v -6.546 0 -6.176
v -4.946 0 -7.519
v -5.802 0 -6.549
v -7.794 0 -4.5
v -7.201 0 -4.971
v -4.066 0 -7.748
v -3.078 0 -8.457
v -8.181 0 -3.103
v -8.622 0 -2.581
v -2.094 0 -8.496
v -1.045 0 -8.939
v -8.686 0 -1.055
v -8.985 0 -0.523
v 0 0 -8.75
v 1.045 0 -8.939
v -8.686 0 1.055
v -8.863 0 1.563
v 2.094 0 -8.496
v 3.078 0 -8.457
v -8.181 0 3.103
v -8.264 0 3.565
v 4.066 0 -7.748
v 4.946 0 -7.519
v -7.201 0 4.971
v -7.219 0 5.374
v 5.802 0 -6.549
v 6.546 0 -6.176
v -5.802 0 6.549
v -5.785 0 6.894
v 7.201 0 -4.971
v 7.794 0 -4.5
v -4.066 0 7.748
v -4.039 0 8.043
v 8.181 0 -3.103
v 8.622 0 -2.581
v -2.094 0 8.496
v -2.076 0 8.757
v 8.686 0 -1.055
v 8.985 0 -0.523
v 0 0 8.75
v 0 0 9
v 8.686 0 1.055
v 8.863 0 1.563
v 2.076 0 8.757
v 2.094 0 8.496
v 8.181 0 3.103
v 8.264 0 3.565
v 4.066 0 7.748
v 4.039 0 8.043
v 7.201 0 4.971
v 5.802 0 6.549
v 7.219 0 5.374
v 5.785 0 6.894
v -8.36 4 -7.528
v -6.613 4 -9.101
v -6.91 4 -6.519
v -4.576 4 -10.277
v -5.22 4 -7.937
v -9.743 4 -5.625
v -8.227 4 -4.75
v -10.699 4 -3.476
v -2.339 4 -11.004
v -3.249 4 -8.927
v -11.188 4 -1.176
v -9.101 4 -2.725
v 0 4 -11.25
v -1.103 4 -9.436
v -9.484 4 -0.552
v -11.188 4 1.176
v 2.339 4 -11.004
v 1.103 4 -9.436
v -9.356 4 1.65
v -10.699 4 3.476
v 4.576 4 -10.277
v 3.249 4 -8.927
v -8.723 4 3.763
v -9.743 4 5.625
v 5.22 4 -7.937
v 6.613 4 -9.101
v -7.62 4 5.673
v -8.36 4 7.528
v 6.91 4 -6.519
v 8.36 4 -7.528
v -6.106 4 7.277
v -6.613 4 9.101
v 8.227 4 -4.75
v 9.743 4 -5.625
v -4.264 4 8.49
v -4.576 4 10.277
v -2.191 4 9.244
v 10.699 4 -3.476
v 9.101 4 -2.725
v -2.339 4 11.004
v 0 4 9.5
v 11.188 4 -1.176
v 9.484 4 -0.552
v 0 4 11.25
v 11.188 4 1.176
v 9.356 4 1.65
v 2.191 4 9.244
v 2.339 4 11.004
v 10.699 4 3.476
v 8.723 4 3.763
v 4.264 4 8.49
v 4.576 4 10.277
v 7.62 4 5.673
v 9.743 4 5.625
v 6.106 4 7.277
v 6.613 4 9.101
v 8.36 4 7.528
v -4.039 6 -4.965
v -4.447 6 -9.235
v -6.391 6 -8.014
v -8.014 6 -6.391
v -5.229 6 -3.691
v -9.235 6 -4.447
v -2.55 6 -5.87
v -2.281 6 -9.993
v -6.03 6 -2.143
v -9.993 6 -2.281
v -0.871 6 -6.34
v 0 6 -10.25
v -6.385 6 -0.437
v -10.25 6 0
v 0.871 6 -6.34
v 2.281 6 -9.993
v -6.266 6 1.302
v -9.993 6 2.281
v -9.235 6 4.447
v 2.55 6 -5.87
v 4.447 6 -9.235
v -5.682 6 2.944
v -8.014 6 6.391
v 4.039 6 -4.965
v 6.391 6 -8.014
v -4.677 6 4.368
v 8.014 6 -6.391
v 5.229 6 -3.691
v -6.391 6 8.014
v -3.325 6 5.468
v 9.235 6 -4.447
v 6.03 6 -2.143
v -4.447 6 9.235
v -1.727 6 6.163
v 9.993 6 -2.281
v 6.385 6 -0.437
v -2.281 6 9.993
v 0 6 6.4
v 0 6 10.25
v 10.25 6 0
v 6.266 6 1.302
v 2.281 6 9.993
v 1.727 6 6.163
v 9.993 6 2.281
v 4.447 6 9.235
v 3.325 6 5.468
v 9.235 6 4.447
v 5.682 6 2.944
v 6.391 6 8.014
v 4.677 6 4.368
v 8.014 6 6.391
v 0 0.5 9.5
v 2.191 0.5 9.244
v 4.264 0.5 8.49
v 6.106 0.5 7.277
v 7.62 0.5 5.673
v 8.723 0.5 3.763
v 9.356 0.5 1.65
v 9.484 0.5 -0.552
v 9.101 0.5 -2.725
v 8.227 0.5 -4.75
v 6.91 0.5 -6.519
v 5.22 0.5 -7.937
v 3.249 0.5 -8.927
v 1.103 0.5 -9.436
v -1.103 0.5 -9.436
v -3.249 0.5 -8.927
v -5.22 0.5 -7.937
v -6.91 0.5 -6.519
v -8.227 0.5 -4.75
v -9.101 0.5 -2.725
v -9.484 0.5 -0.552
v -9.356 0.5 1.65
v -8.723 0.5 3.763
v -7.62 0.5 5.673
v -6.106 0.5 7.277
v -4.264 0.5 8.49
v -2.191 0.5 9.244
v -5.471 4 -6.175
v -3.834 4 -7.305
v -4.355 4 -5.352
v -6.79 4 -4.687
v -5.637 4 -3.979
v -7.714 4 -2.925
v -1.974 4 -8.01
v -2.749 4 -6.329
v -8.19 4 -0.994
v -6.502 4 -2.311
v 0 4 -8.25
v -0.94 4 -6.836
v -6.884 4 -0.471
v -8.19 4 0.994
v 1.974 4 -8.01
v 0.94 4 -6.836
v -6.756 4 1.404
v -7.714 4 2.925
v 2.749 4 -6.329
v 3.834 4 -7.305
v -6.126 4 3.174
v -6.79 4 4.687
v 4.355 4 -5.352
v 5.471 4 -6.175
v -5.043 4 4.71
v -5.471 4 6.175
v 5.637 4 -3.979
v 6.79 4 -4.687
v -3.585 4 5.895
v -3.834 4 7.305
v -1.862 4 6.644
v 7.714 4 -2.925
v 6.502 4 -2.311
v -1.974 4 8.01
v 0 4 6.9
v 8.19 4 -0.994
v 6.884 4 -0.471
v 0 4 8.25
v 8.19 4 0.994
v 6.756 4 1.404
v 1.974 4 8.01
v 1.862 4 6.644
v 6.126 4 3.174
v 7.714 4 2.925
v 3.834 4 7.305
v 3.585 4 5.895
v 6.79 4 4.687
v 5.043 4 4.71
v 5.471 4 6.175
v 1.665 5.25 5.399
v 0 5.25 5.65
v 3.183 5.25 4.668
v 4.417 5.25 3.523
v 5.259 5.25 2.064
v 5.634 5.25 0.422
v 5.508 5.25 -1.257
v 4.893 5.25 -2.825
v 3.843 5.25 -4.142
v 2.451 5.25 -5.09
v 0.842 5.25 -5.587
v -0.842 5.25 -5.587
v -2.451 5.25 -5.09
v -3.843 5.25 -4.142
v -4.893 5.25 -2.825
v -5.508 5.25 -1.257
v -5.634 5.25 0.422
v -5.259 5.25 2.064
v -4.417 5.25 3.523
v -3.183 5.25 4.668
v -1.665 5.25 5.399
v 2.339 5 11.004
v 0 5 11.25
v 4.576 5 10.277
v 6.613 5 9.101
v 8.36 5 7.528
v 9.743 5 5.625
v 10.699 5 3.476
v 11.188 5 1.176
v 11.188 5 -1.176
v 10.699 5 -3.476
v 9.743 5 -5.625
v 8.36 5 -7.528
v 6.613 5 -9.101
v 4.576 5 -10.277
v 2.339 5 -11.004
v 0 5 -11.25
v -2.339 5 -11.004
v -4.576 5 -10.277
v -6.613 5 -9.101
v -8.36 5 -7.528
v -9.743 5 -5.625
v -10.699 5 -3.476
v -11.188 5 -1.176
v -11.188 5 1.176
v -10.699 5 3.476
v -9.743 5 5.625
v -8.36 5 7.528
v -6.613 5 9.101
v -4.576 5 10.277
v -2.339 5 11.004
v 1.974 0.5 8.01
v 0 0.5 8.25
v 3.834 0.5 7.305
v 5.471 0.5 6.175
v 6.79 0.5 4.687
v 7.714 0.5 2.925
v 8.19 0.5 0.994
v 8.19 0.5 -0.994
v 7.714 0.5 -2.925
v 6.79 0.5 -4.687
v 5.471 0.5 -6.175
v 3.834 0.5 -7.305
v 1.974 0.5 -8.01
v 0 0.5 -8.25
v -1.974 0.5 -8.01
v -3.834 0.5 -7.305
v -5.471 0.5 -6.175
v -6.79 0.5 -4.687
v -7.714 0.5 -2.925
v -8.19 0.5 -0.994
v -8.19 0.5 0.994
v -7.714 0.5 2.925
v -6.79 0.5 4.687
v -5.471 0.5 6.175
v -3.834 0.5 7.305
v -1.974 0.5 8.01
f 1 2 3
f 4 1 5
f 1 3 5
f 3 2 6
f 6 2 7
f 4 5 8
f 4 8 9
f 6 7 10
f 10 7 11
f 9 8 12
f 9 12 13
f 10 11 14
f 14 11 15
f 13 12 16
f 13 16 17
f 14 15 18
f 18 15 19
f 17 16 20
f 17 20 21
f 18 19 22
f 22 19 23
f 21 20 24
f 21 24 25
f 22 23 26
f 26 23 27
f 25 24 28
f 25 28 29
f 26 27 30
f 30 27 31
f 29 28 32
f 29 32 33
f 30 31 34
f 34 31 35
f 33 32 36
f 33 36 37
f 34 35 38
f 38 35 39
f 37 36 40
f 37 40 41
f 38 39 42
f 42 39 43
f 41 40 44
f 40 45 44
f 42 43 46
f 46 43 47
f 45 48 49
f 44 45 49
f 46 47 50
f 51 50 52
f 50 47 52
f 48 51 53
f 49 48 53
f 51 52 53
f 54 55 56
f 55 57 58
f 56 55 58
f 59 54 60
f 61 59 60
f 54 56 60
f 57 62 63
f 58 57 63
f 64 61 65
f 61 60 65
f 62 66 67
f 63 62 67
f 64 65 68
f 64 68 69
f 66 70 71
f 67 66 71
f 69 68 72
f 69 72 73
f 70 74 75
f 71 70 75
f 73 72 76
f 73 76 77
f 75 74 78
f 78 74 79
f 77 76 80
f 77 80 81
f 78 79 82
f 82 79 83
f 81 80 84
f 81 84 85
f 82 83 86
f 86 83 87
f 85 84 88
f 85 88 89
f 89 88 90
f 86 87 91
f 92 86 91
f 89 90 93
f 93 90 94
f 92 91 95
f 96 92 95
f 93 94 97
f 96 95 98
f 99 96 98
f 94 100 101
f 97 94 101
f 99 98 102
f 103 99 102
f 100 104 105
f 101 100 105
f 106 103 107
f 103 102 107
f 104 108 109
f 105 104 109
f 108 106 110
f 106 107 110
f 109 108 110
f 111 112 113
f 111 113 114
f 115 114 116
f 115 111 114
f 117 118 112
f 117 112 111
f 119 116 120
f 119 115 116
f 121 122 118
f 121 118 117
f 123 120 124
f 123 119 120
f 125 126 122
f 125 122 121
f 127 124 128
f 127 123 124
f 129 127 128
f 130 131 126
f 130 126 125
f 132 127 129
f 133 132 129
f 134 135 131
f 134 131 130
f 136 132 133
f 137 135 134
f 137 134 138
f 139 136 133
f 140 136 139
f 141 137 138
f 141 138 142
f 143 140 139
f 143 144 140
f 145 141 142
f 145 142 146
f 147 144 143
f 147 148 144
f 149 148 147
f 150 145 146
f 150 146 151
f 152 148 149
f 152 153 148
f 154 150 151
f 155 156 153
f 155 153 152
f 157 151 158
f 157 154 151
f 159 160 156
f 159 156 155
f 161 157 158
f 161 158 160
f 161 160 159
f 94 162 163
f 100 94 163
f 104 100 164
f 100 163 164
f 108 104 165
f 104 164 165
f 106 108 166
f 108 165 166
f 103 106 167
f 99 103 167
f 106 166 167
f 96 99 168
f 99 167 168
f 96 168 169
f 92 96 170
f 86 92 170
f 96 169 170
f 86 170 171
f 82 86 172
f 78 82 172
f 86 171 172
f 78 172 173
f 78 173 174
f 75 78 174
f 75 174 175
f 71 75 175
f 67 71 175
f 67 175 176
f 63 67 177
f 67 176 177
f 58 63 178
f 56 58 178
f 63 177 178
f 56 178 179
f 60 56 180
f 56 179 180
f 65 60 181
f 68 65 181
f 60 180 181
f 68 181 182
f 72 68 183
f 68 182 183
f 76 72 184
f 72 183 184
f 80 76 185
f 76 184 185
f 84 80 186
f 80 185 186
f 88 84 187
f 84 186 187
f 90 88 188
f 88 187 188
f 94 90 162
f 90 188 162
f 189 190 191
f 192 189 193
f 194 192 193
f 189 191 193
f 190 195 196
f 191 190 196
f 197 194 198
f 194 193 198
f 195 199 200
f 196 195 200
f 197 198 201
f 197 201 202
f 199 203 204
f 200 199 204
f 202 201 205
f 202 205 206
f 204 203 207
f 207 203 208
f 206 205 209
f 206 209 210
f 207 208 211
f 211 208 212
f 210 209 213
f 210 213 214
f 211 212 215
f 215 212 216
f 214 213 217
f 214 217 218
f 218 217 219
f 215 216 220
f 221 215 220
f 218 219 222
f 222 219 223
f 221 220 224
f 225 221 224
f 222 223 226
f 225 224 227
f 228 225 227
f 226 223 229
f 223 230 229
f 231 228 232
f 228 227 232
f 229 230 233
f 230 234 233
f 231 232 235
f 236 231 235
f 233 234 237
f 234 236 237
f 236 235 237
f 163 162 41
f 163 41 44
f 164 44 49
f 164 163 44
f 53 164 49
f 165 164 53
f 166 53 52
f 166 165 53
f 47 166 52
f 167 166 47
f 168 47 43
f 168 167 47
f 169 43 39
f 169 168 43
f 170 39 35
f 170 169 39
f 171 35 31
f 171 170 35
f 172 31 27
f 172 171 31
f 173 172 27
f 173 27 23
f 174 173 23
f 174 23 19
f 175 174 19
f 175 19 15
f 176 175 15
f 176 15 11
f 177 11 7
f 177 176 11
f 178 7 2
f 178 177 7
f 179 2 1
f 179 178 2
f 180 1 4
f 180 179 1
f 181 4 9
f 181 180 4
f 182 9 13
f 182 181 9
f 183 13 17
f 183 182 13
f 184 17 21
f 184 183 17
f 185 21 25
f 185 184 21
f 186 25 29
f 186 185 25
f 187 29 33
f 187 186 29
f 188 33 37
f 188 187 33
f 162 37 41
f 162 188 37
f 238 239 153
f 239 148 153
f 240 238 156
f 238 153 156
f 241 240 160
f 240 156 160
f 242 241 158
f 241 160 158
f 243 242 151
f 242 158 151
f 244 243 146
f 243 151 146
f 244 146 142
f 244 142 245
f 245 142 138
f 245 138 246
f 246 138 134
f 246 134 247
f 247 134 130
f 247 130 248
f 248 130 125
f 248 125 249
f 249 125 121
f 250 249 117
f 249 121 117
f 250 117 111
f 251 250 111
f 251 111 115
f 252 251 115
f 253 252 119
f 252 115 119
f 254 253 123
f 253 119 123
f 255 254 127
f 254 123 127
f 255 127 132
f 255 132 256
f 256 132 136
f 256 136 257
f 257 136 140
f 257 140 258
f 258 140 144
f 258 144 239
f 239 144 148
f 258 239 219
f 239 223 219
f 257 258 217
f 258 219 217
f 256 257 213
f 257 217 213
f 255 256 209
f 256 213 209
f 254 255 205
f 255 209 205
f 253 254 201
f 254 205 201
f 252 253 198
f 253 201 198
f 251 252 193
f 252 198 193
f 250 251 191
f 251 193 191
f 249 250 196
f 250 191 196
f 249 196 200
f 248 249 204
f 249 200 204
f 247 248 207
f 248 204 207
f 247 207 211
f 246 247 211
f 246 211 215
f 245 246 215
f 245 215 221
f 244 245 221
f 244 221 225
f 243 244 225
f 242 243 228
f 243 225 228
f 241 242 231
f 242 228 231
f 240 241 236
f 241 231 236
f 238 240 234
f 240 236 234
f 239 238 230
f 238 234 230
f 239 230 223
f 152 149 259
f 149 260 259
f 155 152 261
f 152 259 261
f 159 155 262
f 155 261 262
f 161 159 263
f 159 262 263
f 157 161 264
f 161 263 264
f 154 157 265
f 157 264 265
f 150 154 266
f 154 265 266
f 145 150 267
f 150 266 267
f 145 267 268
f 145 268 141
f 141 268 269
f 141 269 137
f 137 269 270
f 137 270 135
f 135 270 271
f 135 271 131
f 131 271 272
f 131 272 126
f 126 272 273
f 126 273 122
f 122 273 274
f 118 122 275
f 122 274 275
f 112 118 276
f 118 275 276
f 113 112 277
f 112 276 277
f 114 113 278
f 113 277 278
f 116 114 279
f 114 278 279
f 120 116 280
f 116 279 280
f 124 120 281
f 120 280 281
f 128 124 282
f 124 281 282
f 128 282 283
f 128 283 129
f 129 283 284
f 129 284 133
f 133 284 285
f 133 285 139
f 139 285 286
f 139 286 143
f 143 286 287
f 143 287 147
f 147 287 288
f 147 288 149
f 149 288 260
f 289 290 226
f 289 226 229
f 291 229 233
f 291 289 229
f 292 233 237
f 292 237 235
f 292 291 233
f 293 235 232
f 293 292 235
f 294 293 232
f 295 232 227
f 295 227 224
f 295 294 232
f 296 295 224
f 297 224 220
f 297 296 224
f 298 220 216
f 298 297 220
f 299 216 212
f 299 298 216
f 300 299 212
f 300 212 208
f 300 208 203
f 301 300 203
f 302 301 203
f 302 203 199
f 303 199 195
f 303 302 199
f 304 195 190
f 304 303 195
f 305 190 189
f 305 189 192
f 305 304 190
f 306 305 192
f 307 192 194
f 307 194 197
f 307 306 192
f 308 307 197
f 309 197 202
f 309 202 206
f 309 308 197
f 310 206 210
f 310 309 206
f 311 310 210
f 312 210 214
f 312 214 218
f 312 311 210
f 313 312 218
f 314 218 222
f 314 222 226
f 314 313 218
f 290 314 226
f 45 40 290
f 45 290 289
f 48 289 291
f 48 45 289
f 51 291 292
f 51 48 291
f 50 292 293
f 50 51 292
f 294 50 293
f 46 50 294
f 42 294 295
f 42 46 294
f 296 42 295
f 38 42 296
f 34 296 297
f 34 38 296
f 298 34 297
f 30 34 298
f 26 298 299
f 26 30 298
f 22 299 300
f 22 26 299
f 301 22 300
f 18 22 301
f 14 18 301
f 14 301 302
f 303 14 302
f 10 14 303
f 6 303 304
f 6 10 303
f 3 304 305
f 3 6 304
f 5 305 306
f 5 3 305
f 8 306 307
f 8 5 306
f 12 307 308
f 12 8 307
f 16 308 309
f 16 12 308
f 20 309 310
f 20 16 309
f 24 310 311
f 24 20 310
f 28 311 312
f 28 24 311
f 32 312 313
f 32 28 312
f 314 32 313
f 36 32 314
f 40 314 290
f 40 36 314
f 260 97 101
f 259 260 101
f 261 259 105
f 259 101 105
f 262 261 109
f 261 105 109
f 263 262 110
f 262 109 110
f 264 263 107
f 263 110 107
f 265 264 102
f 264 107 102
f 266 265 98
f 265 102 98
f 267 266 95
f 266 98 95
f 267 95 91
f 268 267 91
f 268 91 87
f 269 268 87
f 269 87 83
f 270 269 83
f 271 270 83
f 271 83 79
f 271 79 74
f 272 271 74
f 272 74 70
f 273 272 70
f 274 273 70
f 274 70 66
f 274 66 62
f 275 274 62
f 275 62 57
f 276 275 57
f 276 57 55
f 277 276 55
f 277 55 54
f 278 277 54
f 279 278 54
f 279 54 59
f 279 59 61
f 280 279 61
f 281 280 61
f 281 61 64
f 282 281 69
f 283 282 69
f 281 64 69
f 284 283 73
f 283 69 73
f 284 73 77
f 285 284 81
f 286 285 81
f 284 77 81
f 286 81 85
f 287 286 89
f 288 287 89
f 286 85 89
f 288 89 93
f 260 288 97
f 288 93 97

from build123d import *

# Parameters (mm, degrees)
SKETCH1_R               = 9.5
SKETCH1_R_2             = 8.25
BOSS_EXTRUDE1_DEPTH     = 4
SKETCH2_R               = 11.25
BOSS_EXTRUDE2_DEPTH     = 2
CUT_EXTRUDE1_DEPTH      = 18.003676073
CUT_EXTRUDE1_DEPTH_BACK = 18.003676073
SKETCH3_R               = 5.4
CHAMFER1_SIZE           = 1.5
CHAMFER2_SIZE           = 0.5
CHAMFER3_SIZE           = 1


with BuildPart() as part:
    # Sketch1 → Boss-Extrude1 (new body)
    with BuildSketch(Plane(origin=(0, 0, 0), x_dir=(1, 0, 0), z_dir=(0, 1, 0))):
        with Locations(Location((0, 0, 0), (0, 0, 270))):
            Circle(SKETCH1_R)
        with Locations(Location((0, 0, 0), (0, 0, 270))):
            Circle(SKETCH1_R_2, mode=Mode.SUBTRACT)
    extrude(amount=BOSS_EXTRUDE1_DEPTH)

    # Sketch2 → Boss-Extrude2 (add)
    with BuildSketch(Plane(origin=(0, 4, 0), x_dir=(1, 0, 0), z_dir=(0, 1, 0))):
        with Locations(Location((0, 0, 0), (0, 0, 270))):
            Circle(SKETCH2_R)
    extrude(amount=BOSS_EXTRUDE2_DEPTH)

    # Sketch3 → Cut-Extrude1 (cut, two sides: drawn at the far end of the back side and taken through both)
    with BuildSketch(Plane(origin=(0, 6, 0), x_dir=(1, 0, 0), z_dir=(0, 1, 0)).offset(-CUT_EXTRUDE1_DEPTH_BACK)):
        with Locations(Location((0, 0, 0), (0, 0, 270))):
            Circle(SKETCH3_R)
    extrude(amount=CUT_EXTRUDE1_DEPTH + CUT_EXTRUDE1_DEPTH_BACK, mode=Mode.SUBTRACT)

    # Chamfer1
    chamfer1_edges = [part.edges().sort_by_distance(p)[0] for p in [
        (0, 4, -5.4),
    ]]
    chamfer(chamfer1_edges, length=CHAMFER1_SIZE)

    # Chamfer2
    chamfer2_edges = [part.edges().sort_by_distance(p)[0] for p in [
        (0, 0, -9.5),
        (0, 0, -8.25),
    ]]
    chamfer(chamfer2_edges, length=CHAMFER2_SIZE)

    # Chamfer3
    # the kernel refuses this chamfer: 1 mm, written as the material it takes off along each edge
    with BuildSketch(Plane(origin=(0, 6, 0), x_dir=(0, 0, 1), z_dir=(-1, 0, 0))) as chamfer3_piece_1:
        Polygon((11.25 - CHAMFER3_SIZE, 0), (11.25, -CHAMFER3_SIZE), (11.25, 0), align=None)
    revolve(axis=Axis((0, 6, 0), (0, 1, 0)), mode=Mode.SUBTRACT)
    with BuildSketch(Plane(origin=(0, 6, 0), x_dir=(0, 0, 1), z_dir=(-1, 0, 0))) as chamfer3_piece_2:
        Polygon((5.4, -CHAMFER3_SIZE), (5.4 + CHAMFER3_SIZE, 0), (5.4, 0), align=None)
    revolve(axis=Axis((0, 6, 0), (0, 1, 0)), mode=Mode.SUBTRACT)


solid = part.part
